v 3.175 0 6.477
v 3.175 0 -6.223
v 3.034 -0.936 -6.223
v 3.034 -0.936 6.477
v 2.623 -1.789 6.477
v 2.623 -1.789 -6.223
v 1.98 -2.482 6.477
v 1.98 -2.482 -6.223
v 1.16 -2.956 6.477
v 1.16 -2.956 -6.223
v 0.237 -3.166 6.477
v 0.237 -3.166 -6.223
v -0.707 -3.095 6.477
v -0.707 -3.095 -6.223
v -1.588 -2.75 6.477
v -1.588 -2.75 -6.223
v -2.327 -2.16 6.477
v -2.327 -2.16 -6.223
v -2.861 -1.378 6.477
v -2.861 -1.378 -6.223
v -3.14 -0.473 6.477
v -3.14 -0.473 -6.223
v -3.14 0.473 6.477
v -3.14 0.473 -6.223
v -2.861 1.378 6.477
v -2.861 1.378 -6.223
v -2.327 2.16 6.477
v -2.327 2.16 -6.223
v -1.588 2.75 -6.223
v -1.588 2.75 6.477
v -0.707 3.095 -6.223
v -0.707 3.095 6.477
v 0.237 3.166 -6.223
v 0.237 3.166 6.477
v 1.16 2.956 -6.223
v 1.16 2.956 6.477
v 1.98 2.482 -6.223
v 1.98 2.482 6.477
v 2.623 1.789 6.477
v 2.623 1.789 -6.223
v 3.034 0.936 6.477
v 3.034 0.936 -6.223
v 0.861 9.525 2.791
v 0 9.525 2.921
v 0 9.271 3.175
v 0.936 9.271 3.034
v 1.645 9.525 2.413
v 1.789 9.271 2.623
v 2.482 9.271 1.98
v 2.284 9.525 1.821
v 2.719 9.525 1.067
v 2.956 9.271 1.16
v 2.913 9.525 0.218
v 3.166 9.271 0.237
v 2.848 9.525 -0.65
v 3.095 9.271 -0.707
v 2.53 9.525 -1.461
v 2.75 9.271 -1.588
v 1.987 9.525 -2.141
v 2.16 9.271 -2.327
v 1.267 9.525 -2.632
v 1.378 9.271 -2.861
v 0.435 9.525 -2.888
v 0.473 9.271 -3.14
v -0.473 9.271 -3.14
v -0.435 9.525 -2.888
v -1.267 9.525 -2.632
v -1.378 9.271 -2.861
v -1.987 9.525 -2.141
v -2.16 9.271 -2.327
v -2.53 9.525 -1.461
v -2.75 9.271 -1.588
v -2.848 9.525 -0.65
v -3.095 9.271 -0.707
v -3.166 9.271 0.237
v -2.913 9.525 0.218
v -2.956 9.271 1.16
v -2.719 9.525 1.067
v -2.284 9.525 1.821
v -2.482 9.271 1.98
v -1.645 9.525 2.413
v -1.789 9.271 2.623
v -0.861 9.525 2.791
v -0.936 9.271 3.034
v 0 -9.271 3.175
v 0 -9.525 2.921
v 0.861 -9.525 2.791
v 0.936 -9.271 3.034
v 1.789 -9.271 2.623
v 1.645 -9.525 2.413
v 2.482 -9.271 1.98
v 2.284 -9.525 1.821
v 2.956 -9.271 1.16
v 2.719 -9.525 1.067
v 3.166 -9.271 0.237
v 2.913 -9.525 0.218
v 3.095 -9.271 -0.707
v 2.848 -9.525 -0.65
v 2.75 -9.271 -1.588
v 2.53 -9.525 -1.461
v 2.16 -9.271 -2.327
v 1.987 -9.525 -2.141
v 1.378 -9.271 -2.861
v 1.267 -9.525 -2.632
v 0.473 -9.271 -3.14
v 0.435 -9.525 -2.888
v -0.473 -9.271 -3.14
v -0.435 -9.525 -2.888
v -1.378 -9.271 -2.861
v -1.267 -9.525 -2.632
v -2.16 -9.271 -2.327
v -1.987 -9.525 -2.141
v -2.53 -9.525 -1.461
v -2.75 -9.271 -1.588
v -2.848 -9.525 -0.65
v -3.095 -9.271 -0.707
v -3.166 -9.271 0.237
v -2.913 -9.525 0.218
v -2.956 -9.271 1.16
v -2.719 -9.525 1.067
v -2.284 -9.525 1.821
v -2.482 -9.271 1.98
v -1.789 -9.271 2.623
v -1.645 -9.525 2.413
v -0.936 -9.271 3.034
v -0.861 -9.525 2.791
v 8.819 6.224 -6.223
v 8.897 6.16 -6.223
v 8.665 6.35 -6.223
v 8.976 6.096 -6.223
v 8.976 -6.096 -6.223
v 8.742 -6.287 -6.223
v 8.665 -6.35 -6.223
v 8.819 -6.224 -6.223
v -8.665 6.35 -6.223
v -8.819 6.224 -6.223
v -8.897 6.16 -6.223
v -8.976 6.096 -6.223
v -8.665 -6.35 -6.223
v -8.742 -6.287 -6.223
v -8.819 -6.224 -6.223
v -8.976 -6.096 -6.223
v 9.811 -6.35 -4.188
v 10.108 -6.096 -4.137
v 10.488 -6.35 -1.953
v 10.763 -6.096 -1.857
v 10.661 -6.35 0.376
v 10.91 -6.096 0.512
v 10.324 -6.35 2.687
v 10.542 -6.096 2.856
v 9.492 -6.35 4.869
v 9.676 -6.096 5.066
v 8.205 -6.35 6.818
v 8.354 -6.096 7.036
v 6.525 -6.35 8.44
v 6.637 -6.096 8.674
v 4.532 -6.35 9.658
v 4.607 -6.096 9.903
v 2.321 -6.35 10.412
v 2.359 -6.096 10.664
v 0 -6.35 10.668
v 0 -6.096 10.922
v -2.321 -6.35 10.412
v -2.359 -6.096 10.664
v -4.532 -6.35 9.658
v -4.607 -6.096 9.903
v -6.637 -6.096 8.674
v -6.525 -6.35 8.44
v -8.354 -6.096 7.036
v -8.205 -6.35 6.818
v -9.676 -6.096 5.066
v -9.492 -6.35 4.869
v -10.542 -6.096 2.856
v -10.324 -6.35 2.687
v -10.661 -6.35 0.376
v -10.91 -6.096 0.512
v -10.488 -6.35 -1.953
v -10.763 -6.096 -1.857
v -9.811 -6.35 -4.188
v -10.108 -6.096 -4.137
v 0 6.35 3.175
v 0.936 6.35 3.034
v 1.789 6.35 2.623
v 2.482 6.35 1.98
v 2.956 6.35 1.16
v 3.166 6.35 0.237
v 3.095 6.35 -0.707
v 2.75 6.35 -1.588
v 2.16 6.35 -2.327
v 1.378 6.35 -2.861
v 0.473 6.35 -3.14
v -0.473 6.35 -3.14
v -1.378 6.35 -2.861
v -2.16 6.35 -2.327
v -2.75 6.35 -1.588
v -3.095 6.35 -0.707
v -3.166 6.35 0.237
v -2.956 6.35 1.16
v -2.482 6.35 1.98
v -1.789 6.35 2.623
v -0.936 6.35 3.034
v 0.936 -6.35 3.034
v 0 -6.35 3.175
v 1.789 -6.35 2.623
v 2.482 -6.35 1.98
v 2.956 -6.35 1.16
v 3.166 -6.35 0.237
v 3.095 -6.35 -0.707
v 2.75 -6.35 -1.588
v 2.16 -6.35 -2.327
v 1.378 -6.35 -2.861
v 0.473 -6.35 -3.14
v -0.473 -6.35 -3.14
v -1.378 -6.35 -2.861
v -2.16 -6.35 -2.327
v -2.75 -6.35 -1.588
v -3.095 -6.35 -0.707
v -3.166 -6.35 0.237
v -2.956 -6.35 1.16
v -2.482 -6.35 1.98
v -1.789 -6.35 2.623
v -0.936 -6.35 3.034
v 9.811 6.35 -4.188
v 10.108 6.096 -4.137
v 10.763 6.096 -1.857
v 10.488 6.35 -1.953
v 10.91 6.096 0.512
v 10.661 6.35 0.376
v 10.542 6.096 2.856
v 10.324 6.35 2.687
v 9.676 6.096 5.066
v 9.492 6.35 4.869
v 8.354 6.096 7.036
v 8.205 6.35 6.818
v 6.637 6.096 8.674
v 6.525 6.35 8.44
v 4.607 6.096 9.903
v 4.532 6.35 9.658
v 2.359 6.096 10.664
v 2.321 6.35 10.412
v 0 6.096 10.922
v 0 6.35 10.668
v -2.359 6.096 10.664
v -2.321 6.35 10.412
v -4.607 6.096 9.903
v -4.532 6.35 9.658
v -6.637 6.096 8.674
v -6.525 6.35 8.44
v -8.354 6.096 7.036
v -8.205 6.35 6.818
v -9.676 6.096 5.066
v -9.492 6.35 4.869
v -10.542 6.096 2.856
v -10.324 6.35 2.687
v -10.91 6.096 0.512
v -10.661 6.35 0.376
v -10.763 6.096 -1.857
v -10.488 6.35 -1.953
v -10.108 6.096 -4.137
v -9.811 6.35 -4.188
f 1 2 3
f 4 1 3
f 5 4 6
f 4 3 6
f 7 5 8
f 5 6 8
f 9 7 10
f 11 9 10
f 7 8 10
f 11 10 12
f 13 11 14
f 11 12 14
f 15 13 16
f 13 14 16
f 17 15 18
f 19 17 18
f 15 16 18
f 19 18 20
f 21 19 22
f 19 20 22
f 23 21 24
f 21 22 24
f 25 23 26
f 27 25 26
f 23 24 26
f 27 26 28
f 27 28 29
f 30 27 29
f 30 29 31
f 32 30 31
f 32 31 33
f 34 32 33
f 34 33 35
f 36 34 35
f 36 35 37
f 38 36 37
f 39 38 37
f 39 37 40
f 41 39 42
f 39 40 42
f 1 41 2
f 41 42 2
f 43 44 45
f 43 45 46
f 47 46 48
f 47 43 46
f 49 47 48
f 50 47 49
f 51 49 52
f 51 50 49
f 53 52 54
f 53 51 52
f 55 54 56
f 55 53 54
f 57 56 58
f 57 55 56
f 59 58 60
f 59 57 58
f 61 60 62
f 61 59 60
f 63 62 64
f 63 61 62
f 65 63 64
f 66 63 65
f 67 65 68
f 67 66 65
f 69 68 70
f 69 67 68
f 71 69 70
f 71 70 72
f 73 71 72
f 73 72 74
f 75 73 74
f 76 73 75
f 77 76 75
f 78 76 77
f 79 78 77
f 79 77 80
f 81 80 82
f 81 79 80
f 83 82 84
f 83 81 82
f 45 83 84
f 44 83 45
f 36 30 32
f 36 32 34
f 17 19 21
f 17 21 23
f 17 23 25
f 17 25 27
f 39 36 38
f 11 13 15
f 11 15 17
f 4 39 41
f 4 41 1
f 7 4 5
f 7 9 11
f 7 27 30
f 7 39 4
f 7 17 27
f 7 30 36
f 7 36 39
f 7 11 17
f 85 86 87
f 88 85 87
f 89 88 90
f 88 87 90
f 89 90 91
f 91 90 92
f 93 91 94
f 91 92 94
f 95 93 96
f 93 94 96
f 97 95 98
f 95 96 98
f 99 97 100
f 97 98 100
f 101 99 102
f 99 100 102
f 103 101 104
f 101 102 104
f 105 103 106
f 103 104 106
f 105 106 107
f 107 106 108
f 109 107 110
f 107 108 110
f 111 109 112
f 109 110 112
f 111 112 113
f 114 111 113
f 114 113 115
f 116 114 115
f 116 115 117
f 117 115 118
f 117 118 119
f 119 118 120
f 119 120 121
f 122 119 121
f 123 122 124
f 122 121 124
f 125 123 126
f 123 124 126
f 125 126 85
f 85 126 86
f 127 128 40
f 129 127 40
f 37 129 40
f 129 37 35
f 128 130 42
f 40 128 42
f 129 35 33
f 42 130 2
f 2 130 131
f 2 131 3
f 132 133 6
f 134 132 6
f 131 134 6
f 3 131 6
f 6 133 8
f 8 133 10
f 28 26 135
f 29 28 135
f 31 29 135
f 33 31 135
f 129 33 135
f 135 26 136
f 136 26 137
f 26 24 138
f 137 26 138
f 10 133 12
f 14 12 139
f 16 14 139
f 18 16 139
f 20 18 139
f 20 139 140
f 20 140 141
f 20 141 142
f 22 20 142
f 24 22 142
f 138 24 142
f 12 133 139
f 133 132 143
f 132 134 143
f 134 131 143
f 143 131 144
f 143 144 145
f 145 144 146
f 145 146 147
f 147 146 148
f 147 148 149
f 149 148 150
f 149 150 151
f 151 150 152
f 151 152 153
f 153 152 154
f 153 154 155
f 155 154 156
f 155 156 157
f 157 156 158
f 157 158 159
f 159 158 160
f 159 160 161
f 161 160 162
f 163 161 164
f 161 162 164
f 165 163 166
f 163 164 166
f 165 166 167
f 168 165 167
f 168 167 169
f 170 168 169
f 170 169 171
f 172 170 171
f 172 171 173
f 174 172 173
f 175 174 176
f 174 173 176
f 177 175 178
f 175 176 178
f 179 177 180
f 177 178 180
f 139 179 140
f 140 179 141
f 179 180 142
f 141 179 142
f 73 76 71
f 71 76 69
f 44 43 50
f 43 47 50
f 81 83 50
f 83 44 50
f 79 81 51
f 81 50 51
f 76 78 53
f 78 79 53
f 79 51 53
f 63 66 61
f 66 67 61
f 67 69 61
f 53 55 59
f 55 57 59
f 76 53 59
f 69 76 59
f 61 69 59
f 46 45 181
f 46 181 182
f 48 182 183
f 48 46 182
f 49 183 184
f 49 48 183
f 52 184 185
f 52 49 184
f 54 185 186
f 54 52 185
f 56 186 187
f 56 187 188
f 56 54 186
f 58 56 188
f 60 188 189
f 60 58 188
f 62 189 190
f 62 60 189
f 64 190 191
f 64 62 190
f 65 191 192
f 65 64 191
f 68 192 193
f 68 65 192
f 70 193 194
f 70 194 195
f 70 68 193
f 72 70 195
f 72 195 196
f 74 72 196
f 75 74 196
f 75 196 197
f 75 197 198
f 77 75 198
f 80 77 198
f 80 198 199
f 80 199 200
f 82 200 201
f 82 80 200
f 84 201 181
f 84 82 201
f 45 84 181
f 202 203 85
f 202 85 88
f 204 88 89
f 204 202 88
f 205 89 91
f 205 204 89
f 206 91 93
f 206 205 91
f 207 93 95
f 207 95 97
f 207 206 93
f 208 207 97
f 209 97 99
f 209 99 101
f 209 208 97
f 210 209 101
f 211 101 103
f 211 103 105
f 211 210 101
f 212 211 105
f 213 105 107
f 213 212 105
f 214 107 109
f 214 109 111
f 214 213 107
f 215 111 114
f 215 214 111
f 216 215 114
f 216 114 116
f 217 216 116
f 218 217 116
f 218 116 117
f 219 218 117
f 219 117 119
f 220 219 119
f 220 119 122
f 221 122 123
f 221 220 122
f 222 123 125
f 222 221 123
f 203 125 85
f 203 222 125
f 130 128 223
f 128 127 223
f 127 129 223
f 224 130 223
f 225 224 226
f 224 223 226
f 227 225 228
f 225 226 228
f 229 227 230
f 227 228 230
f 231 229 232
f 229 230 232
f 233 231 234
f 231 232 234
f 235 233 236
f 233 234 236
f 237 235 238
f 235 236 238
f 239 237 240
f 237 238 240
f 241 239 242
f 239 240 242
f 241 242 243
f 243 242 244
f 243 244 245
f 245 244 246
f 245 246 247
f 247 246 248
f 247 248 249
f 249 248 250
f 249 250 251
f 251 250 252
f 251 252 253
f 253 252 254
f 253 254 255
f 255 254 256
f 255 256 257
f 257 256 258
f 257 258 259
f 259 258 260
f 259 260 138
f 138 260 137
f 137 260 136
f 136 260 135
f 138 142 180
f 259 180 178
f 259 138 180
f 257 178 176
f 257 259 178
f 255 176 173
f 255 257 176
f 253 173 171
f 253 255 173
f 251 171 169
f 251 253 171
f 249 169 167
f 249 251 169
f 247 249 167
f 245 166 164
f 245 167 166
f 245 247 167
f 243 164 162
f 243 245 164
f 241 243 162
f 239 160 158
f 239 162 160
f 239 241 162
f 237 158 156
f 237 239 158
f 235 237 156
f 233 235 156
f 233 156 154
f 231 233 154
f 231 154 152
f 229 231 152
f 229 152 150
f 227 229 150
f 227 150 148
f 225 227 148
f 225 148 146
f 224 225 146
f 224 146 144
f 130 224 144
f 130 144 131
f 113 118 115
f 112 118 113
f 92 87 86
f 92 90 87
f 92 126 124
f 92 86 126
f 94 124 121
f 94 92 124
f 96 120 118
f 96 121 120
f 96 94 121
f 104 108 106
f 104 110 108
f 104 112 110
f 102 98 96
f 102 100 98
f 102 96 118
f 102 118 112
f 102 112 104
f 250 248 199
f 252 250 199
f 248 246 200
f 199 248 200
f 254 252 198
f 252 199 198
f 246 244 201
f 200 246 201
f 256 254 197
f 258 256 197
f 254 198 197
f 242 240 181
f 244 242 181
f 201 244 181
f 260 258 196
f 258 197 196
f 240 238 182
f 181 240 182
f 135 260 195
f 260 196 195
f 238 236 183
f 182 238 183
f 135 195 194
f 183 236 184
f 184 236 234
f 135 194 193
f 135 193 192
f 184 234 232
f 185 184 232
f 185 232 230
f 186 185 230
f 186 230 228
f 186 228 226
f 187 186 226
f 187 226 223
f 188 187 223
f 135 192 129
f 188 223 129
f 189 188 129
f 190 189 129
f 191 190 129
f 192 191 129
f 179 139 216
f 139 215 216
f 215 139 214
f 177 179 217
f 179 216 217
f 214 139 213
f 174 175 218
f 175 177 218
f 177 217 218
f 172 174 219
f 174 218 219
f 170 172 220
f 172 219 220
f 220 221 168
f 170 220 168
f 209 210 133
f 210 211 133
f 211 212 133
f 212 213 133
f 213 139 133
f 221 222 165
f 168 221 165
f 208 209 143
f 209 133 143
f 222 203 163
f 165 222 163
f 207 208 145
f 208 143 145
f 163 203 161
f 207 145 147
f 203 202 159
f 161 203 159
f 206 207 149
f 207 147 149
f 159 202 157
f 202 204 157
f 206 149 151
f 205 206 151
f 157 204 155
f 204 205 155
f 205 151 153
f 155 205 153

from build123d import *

# Parameters (mm, degrees)
F0_W     = 12.7
F0_H     = 7.747
F0_H_2   = 3.175
F0_W_2   = 3.175
F3_DEPTH = 15.876
F4_SIZE  = 0.254
F5_R     = 3.175
F6_DEPTH = 12.7


with BuildPart() as f1:
    # F0 (on Right) → F1 (revolve)
    with BuildSketch(Plane.YZ):
        with Locations((0, 7.0485)):
            Rectangle(F0_W, F0_H)
        with Locations((0, 1.5875)):
            Rectangle(F0_W, F0_H_2)
        with Locations((-7.9375, 1.5875)):
            Rectangle(F0_W_2, F0_H_2)
        with Locations((7.9375, 1.5875)):
            Rectangle(F0_W_2, F0_H_2)
    revolve(axis=Axis((0, 0, 0), (0, 1, 0)))

    # F2 (on face) → F3 (cut, through all)
    with BuildSketch(Plane.XZ.offset(6.35)):
        with BuildLine():
            Line((-8.9757648699, -6.223), (-10.8736076074, -6.223))
            Line((-10.8736076074, -6.223), (-10.8736076074, -16.0401048288))
            Line((-10.8736076074, -16.0401048288), (15.6559471654, -16.0401048288))
            Line((15.6559471654, -16.0401048288), (15.6559471654, -6.223))
            Line((15.6559471654, -6.223), (8.9757648699, -6.223))
            ThreePointArc((8.9757648699, -6.223), (0, -10.922), (-8.9757648699, -6.223))
        make_face()
        with BuildLine():
            Line((8.9757648699, -6.223), (-8.9757648699, -6.223))
            ThreePointArc((-8.9757648699, -6.223), (0, -10.922), (8.9757648699, -6.223))
        make_face()
    extrude(amount=-F3_DEPTH, mode=Mode.SUBTRACT)

    # F4
    f4_edges = [f1.edges().sort_by_distance(p)[0] for p in [
        (0, -9.525, -3.175),
        (0, -6.35, 10.922),
        (0, 6.35, 10.922),
        (0, 9.525, -3.175),
    ]]
    chamfer(f4_edges, length=F4_SIZE)

    # F5 (on face) → F6 (cut)
    with BuildSketch(Plane(origin=(0, 0, -6.223), x_dir=(1, 0, 0), z_dir=(0, 0, -1))):
        Circle(F5_R)
    extrude(amount=-F6_DEPTH, mode=Mode.SUBTRACT)


solid = f1.part
